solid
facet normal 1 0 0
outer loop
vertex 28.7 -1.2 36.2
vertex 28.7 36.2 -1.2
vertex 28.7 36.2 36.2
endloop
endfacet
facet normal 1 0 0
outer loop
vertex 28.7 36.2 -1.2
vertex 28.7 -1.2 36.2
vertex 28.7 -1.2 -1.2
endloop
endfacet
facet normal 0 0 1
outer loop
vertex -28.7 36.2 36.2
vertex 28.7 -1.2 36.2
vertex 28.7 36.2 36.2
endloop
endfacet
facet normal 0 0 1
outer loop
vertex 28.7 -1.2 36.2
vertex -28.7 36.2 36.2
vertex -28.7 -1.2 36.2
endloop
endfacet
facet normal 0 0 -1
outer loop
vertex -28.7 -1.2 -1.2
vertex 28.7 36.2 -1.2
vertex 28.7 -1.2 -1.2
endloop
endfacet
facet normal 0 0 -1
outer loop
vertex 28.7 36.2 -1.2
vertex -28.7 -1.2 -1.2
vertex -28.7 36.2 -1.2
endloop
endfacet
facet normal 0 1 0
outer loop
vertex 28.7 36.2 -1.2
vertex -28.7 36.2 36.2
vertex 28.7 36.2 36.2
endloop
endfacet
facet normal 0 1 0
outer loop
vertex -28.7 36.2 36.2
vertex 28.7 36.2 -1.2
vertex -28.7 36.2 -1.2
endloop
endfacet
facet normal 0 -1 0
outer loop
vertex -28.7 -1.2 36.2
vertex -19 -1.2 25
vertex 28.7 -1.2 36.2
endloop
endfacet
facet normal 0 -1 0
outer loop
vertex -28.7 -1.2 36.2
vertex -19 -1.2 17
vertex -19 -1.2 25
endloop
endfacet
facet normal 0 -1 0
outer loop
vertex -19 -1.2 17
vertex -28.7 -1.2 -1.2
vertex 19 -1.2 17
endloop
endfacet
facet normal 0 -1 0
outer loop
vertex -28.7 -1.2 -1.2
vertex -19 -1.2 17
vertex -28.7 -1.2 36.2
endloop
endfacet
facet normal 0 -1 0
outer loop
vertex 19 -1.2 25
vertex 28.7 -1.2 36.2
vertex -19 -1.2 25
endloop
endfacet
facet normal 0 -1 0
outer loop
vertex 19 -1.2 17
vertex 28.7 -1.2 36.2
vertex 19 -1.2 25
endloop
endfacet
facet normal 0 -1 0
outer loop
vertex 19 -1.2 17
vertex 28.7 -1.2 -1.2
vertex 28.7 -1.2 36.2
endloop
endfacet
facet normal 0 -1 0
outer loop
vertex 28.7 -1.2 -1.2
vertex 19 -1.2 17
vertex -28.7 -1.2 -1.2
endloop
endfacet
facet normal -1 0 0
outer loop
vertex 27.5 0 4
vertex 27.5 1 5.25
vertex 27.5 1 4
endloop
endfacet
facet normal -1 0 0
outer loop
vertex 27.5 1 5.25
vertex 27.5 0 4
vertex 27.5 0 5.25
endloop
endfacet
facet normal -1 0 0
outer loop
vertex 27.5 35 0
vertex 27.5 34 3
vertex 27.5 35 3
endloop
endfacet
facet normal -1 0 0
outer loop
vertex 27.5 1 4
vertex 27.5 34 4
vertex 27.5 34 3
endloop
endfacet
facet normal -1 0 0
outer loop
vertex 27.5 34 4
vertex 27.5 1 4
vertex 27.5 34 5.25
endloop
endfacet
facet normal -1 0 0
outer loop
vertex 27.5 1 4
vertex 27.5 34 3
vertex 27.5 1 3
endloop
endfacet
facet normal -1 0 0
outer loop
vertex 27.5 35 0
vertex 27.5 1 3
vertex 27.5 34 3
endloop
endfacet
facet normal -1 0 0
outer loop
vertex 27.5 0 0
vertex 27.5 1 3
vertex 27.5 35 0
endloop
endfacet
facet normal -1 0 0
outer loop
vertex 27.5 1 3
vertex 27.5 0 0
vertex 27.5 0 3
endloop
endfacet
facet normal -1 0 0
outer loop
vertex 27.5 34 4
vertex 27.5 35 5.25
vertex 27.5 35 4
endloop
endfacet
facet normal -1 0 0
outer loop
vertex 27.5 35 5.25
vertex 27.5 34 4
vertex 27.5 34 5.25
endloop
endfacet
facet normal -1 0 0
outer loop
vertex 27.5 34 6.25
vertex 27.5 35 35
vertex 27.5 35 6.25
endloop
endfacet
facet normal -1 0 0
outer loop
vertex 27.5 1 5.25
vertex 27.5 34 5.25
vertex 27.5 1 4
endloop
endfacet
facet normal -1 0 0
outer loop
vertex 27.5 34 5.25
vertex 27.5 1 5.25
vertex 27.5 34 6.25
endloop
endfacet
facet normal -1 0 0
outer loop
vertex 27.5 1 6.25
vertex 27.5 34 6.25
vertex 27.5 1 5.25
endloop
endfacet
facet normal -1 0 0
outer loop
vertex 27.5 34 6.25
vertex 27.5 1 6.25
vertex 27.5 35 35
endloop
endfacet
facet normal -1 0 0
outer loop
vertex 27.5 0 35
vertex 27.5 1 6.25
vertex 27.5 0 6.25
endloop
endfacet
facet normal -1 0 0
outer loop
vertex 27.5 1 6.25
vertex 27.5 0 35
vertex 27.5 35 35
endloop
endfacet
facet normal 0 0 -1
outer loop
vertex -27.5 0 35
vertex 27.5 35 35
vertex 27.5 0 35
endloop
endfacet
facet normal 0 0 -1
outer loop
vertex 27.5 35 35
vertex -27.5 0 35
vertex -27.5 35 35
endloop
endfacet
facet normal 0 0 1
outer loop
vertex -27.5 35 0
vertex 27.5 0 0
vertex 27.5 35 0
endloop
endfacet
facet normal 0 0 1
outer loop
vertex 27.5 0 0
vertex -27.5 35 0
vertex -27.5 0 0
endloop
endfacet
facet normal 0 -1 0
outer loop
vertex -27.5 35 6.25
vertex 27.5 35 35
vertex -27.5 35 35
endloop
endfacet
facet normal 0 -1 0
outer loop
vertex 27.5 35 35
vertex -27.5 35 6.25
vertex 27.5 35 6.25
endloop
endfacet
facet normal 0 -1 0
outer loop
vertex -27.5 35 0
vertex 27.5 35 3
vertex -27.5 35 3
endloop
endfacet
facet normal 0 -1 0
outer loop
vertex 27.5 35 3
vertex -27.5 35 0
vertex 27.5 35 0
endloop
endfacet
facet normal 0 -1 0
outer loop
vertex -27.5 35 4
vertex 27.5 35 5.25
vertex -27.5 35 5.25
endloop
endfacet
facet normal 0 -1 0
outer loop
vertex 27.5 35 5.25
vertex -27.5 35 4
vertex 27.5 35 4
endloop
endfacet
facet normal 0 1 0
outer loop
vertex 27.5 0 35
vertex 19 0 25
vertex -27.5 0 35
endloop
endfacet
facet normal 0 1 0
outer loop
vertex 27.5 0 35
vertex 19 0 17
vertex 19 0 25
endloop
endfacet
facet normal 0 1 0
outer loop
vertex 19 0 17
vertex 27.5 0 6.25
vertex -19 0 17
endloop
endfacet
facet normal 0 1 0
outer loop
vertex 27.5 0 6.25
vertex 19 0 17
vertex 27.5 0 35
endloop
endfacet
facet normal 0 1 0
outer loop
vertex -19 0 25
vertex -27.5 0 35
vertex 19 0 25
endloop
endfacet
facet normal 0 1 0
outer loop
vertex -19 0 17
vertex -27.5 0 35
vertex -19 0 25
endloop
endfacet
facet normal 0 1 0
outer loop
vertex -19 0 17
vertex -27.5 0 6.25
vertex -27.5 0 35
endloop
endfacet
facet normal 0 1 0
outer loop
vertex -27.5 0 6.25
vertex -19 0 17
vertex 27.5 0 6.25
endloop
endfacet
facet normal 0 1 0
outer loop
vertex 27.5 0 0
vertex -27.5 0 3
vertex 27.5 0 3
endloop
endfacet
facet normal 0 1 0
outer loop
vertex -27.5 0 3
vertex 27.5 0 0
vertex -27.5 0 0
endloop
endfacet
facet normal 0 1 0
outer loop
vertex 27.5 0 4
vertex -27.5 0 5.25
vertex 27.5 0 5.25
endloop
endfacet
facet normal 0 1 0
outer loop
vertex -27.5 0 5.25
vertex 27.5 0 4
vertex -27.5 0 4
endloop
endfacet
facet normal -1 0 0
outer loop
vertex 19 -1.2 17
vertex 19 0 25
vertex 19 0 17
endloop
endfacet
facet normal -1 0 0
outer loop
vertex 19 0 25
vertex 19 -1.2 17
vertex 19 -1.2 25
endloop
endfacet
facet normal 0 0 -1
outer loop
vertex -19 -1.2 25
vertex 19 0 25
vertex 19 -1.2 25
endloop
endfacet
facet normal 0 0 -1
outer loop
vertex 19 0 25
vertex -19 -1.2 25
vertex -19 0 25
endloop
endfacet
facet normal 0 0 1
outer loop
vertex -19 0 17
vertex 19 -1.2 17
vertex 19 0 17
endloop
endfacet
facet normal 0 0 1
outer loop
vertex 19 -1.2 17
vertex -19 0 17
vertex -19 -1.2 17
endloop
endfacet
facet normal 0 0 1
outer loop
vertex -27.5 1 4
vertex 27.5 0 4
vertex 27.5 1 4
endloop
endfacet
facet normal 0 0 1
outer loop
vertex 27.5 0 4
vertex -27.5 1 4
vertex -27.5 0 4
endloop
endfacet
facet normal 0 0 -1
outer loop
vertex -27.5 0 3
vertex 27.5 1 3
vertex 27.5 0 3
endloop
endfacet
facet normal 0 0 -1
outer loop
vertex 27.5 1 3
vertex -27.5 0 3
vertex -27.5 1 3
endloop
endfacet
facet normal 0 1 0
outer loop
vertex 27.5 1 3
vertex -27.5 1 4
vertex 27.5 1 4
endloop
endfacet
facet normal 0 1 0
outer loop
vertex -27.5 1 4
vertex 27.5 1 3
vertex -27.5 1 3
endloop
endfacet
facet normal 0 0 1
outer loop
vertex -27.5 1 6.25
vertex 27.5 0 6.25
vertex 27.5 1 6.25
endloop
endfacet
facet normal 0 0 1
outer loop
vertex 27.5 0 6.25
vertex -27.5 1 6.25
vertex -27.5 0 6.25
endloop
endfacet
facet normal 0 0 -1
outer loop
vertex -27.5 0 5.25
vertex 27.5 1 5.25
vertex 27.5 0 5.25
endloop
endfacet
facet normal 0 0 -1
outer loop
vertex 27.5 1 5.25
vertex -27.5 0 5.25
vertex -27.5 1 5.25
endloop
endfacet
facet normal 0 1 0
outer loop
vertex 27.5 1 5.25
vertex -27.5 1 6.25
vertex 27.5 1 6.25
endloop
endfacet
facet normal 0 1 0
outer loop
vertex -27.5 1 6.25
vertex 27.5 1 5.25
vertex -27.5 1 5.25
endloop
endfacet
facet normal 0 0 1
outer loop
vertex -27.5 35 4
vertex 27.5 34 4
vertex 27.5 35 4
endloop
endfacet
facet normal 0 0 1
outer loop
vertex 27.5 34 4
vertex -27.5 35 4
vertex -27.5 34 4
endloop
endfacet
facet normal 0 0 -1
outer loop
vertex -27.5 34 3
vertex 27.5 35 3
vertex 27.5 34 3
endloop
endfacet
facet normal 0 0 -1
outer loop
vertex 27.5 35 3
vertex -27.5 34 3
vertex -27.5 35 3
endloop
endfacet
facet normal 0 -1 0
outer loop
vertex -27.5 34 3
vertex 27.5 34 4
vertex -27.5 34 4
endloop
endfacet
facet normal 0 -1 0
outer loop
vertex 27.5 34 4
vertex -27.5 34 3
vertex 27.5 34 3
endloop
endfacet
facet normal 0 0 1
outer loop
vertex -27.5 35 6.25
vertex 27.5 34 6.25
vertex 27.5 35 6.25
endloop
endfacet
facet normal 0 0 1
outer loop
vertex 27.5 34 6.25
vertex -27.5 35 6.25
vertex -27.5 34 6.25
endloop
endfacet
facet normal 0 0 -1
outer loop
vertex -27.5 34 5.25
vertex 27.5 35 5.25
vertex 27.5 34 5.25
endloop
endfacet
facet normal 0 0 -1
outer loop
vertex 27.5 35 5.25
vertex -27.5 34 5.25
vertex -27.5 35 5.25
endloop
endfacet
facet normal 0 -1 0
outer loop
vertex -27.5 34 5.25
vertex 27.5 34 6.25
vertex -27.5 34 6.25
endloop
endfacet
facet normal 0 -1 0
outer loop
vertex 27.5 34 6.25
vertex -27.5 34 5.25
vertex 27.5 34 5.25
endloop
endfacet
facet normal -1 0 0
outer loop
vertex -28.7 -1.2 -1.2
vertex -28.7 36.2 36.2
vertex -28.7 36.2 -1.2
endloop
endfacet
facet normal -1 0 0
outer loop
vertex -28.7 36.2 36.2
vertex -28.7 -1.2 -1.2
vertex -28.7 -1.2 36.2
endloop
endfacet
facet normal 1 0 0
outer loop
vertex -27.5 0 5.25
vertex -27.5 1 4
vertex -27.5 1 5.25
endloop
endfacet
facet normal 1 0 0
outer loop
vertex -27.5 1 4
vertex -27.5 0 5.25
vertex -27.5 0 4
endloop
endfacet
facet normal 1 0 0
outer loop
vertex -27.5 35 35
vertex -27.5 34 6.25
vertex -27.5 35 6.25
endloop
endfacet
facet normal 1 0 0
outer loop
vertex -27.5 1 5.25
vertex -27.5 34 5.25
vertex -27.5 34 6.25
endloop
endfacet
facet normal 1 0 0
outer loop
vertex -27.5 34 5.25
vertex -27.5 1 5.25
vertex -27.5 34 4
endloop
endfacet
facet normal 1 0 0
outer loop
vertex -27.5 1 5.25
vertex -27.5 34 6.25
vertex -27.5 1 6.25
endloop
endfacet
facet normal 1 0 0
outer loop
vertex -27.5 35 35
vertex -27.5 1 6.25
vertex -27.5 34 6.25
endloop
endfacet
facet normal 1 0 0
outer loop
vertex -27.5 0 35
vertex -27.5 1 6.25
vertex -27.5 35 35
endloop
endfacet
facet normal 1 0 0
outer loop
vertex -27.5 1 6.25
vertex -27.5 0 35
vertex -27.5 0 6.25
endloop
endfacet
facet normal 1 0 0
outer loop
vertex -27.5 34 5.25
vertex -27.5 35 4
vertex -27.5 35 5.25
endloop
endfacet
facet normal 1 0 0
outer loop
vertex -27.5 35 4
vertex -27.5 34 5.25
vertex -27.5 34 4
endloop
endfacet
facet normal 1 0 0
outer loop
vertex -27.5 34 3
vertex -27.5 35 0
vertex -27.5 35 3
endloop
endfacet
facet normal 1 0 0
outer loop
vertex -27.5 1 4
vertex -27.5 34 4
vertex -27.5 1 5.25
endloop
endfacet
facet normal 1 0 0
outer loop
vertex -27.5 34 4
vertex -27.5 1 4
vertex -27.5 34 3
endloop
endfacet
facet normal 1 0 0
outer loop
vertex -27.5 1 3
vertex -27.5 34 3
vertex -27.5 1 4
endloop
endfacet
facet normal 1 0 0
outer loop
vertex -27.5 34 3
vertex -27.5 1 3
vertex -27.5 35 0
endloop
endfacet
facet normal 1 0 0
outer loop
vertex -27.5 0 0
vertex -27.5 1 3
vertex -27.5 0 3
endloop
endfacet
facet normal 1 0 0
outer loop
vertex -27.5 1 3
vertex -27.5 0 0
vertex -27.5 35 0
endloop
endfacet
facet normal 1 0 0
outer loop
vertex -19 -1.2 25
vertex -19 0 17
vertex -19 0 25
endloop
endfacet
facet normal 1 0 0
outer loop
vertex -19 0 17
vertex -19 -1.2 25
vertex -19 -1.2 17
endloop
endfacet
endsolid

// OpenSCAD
width = 27.5;
depth = 35;
height = 35;
t = 1.2;
h = 3;
d = 1.25;

module huelle() {
difference()
{
    translate([0, -t, -t]) cube([width+t, depth+2*t, height+2*t]);
    cube([width, depth, height]);
    translate([0, -t, 17]) cube([19, t, 8]);
}

translate([0, 0, h]) cube([width, 1, 1]);
translate([0, 0, h+1+d]) cube([width, 1, 1]);

translate([0, depth-1, h]) cube([width, 1, 1]);
translate([0, depth-1, h+1+d]) cube([width, 1, 1]);
}

huelle();
mirror() huelle();
